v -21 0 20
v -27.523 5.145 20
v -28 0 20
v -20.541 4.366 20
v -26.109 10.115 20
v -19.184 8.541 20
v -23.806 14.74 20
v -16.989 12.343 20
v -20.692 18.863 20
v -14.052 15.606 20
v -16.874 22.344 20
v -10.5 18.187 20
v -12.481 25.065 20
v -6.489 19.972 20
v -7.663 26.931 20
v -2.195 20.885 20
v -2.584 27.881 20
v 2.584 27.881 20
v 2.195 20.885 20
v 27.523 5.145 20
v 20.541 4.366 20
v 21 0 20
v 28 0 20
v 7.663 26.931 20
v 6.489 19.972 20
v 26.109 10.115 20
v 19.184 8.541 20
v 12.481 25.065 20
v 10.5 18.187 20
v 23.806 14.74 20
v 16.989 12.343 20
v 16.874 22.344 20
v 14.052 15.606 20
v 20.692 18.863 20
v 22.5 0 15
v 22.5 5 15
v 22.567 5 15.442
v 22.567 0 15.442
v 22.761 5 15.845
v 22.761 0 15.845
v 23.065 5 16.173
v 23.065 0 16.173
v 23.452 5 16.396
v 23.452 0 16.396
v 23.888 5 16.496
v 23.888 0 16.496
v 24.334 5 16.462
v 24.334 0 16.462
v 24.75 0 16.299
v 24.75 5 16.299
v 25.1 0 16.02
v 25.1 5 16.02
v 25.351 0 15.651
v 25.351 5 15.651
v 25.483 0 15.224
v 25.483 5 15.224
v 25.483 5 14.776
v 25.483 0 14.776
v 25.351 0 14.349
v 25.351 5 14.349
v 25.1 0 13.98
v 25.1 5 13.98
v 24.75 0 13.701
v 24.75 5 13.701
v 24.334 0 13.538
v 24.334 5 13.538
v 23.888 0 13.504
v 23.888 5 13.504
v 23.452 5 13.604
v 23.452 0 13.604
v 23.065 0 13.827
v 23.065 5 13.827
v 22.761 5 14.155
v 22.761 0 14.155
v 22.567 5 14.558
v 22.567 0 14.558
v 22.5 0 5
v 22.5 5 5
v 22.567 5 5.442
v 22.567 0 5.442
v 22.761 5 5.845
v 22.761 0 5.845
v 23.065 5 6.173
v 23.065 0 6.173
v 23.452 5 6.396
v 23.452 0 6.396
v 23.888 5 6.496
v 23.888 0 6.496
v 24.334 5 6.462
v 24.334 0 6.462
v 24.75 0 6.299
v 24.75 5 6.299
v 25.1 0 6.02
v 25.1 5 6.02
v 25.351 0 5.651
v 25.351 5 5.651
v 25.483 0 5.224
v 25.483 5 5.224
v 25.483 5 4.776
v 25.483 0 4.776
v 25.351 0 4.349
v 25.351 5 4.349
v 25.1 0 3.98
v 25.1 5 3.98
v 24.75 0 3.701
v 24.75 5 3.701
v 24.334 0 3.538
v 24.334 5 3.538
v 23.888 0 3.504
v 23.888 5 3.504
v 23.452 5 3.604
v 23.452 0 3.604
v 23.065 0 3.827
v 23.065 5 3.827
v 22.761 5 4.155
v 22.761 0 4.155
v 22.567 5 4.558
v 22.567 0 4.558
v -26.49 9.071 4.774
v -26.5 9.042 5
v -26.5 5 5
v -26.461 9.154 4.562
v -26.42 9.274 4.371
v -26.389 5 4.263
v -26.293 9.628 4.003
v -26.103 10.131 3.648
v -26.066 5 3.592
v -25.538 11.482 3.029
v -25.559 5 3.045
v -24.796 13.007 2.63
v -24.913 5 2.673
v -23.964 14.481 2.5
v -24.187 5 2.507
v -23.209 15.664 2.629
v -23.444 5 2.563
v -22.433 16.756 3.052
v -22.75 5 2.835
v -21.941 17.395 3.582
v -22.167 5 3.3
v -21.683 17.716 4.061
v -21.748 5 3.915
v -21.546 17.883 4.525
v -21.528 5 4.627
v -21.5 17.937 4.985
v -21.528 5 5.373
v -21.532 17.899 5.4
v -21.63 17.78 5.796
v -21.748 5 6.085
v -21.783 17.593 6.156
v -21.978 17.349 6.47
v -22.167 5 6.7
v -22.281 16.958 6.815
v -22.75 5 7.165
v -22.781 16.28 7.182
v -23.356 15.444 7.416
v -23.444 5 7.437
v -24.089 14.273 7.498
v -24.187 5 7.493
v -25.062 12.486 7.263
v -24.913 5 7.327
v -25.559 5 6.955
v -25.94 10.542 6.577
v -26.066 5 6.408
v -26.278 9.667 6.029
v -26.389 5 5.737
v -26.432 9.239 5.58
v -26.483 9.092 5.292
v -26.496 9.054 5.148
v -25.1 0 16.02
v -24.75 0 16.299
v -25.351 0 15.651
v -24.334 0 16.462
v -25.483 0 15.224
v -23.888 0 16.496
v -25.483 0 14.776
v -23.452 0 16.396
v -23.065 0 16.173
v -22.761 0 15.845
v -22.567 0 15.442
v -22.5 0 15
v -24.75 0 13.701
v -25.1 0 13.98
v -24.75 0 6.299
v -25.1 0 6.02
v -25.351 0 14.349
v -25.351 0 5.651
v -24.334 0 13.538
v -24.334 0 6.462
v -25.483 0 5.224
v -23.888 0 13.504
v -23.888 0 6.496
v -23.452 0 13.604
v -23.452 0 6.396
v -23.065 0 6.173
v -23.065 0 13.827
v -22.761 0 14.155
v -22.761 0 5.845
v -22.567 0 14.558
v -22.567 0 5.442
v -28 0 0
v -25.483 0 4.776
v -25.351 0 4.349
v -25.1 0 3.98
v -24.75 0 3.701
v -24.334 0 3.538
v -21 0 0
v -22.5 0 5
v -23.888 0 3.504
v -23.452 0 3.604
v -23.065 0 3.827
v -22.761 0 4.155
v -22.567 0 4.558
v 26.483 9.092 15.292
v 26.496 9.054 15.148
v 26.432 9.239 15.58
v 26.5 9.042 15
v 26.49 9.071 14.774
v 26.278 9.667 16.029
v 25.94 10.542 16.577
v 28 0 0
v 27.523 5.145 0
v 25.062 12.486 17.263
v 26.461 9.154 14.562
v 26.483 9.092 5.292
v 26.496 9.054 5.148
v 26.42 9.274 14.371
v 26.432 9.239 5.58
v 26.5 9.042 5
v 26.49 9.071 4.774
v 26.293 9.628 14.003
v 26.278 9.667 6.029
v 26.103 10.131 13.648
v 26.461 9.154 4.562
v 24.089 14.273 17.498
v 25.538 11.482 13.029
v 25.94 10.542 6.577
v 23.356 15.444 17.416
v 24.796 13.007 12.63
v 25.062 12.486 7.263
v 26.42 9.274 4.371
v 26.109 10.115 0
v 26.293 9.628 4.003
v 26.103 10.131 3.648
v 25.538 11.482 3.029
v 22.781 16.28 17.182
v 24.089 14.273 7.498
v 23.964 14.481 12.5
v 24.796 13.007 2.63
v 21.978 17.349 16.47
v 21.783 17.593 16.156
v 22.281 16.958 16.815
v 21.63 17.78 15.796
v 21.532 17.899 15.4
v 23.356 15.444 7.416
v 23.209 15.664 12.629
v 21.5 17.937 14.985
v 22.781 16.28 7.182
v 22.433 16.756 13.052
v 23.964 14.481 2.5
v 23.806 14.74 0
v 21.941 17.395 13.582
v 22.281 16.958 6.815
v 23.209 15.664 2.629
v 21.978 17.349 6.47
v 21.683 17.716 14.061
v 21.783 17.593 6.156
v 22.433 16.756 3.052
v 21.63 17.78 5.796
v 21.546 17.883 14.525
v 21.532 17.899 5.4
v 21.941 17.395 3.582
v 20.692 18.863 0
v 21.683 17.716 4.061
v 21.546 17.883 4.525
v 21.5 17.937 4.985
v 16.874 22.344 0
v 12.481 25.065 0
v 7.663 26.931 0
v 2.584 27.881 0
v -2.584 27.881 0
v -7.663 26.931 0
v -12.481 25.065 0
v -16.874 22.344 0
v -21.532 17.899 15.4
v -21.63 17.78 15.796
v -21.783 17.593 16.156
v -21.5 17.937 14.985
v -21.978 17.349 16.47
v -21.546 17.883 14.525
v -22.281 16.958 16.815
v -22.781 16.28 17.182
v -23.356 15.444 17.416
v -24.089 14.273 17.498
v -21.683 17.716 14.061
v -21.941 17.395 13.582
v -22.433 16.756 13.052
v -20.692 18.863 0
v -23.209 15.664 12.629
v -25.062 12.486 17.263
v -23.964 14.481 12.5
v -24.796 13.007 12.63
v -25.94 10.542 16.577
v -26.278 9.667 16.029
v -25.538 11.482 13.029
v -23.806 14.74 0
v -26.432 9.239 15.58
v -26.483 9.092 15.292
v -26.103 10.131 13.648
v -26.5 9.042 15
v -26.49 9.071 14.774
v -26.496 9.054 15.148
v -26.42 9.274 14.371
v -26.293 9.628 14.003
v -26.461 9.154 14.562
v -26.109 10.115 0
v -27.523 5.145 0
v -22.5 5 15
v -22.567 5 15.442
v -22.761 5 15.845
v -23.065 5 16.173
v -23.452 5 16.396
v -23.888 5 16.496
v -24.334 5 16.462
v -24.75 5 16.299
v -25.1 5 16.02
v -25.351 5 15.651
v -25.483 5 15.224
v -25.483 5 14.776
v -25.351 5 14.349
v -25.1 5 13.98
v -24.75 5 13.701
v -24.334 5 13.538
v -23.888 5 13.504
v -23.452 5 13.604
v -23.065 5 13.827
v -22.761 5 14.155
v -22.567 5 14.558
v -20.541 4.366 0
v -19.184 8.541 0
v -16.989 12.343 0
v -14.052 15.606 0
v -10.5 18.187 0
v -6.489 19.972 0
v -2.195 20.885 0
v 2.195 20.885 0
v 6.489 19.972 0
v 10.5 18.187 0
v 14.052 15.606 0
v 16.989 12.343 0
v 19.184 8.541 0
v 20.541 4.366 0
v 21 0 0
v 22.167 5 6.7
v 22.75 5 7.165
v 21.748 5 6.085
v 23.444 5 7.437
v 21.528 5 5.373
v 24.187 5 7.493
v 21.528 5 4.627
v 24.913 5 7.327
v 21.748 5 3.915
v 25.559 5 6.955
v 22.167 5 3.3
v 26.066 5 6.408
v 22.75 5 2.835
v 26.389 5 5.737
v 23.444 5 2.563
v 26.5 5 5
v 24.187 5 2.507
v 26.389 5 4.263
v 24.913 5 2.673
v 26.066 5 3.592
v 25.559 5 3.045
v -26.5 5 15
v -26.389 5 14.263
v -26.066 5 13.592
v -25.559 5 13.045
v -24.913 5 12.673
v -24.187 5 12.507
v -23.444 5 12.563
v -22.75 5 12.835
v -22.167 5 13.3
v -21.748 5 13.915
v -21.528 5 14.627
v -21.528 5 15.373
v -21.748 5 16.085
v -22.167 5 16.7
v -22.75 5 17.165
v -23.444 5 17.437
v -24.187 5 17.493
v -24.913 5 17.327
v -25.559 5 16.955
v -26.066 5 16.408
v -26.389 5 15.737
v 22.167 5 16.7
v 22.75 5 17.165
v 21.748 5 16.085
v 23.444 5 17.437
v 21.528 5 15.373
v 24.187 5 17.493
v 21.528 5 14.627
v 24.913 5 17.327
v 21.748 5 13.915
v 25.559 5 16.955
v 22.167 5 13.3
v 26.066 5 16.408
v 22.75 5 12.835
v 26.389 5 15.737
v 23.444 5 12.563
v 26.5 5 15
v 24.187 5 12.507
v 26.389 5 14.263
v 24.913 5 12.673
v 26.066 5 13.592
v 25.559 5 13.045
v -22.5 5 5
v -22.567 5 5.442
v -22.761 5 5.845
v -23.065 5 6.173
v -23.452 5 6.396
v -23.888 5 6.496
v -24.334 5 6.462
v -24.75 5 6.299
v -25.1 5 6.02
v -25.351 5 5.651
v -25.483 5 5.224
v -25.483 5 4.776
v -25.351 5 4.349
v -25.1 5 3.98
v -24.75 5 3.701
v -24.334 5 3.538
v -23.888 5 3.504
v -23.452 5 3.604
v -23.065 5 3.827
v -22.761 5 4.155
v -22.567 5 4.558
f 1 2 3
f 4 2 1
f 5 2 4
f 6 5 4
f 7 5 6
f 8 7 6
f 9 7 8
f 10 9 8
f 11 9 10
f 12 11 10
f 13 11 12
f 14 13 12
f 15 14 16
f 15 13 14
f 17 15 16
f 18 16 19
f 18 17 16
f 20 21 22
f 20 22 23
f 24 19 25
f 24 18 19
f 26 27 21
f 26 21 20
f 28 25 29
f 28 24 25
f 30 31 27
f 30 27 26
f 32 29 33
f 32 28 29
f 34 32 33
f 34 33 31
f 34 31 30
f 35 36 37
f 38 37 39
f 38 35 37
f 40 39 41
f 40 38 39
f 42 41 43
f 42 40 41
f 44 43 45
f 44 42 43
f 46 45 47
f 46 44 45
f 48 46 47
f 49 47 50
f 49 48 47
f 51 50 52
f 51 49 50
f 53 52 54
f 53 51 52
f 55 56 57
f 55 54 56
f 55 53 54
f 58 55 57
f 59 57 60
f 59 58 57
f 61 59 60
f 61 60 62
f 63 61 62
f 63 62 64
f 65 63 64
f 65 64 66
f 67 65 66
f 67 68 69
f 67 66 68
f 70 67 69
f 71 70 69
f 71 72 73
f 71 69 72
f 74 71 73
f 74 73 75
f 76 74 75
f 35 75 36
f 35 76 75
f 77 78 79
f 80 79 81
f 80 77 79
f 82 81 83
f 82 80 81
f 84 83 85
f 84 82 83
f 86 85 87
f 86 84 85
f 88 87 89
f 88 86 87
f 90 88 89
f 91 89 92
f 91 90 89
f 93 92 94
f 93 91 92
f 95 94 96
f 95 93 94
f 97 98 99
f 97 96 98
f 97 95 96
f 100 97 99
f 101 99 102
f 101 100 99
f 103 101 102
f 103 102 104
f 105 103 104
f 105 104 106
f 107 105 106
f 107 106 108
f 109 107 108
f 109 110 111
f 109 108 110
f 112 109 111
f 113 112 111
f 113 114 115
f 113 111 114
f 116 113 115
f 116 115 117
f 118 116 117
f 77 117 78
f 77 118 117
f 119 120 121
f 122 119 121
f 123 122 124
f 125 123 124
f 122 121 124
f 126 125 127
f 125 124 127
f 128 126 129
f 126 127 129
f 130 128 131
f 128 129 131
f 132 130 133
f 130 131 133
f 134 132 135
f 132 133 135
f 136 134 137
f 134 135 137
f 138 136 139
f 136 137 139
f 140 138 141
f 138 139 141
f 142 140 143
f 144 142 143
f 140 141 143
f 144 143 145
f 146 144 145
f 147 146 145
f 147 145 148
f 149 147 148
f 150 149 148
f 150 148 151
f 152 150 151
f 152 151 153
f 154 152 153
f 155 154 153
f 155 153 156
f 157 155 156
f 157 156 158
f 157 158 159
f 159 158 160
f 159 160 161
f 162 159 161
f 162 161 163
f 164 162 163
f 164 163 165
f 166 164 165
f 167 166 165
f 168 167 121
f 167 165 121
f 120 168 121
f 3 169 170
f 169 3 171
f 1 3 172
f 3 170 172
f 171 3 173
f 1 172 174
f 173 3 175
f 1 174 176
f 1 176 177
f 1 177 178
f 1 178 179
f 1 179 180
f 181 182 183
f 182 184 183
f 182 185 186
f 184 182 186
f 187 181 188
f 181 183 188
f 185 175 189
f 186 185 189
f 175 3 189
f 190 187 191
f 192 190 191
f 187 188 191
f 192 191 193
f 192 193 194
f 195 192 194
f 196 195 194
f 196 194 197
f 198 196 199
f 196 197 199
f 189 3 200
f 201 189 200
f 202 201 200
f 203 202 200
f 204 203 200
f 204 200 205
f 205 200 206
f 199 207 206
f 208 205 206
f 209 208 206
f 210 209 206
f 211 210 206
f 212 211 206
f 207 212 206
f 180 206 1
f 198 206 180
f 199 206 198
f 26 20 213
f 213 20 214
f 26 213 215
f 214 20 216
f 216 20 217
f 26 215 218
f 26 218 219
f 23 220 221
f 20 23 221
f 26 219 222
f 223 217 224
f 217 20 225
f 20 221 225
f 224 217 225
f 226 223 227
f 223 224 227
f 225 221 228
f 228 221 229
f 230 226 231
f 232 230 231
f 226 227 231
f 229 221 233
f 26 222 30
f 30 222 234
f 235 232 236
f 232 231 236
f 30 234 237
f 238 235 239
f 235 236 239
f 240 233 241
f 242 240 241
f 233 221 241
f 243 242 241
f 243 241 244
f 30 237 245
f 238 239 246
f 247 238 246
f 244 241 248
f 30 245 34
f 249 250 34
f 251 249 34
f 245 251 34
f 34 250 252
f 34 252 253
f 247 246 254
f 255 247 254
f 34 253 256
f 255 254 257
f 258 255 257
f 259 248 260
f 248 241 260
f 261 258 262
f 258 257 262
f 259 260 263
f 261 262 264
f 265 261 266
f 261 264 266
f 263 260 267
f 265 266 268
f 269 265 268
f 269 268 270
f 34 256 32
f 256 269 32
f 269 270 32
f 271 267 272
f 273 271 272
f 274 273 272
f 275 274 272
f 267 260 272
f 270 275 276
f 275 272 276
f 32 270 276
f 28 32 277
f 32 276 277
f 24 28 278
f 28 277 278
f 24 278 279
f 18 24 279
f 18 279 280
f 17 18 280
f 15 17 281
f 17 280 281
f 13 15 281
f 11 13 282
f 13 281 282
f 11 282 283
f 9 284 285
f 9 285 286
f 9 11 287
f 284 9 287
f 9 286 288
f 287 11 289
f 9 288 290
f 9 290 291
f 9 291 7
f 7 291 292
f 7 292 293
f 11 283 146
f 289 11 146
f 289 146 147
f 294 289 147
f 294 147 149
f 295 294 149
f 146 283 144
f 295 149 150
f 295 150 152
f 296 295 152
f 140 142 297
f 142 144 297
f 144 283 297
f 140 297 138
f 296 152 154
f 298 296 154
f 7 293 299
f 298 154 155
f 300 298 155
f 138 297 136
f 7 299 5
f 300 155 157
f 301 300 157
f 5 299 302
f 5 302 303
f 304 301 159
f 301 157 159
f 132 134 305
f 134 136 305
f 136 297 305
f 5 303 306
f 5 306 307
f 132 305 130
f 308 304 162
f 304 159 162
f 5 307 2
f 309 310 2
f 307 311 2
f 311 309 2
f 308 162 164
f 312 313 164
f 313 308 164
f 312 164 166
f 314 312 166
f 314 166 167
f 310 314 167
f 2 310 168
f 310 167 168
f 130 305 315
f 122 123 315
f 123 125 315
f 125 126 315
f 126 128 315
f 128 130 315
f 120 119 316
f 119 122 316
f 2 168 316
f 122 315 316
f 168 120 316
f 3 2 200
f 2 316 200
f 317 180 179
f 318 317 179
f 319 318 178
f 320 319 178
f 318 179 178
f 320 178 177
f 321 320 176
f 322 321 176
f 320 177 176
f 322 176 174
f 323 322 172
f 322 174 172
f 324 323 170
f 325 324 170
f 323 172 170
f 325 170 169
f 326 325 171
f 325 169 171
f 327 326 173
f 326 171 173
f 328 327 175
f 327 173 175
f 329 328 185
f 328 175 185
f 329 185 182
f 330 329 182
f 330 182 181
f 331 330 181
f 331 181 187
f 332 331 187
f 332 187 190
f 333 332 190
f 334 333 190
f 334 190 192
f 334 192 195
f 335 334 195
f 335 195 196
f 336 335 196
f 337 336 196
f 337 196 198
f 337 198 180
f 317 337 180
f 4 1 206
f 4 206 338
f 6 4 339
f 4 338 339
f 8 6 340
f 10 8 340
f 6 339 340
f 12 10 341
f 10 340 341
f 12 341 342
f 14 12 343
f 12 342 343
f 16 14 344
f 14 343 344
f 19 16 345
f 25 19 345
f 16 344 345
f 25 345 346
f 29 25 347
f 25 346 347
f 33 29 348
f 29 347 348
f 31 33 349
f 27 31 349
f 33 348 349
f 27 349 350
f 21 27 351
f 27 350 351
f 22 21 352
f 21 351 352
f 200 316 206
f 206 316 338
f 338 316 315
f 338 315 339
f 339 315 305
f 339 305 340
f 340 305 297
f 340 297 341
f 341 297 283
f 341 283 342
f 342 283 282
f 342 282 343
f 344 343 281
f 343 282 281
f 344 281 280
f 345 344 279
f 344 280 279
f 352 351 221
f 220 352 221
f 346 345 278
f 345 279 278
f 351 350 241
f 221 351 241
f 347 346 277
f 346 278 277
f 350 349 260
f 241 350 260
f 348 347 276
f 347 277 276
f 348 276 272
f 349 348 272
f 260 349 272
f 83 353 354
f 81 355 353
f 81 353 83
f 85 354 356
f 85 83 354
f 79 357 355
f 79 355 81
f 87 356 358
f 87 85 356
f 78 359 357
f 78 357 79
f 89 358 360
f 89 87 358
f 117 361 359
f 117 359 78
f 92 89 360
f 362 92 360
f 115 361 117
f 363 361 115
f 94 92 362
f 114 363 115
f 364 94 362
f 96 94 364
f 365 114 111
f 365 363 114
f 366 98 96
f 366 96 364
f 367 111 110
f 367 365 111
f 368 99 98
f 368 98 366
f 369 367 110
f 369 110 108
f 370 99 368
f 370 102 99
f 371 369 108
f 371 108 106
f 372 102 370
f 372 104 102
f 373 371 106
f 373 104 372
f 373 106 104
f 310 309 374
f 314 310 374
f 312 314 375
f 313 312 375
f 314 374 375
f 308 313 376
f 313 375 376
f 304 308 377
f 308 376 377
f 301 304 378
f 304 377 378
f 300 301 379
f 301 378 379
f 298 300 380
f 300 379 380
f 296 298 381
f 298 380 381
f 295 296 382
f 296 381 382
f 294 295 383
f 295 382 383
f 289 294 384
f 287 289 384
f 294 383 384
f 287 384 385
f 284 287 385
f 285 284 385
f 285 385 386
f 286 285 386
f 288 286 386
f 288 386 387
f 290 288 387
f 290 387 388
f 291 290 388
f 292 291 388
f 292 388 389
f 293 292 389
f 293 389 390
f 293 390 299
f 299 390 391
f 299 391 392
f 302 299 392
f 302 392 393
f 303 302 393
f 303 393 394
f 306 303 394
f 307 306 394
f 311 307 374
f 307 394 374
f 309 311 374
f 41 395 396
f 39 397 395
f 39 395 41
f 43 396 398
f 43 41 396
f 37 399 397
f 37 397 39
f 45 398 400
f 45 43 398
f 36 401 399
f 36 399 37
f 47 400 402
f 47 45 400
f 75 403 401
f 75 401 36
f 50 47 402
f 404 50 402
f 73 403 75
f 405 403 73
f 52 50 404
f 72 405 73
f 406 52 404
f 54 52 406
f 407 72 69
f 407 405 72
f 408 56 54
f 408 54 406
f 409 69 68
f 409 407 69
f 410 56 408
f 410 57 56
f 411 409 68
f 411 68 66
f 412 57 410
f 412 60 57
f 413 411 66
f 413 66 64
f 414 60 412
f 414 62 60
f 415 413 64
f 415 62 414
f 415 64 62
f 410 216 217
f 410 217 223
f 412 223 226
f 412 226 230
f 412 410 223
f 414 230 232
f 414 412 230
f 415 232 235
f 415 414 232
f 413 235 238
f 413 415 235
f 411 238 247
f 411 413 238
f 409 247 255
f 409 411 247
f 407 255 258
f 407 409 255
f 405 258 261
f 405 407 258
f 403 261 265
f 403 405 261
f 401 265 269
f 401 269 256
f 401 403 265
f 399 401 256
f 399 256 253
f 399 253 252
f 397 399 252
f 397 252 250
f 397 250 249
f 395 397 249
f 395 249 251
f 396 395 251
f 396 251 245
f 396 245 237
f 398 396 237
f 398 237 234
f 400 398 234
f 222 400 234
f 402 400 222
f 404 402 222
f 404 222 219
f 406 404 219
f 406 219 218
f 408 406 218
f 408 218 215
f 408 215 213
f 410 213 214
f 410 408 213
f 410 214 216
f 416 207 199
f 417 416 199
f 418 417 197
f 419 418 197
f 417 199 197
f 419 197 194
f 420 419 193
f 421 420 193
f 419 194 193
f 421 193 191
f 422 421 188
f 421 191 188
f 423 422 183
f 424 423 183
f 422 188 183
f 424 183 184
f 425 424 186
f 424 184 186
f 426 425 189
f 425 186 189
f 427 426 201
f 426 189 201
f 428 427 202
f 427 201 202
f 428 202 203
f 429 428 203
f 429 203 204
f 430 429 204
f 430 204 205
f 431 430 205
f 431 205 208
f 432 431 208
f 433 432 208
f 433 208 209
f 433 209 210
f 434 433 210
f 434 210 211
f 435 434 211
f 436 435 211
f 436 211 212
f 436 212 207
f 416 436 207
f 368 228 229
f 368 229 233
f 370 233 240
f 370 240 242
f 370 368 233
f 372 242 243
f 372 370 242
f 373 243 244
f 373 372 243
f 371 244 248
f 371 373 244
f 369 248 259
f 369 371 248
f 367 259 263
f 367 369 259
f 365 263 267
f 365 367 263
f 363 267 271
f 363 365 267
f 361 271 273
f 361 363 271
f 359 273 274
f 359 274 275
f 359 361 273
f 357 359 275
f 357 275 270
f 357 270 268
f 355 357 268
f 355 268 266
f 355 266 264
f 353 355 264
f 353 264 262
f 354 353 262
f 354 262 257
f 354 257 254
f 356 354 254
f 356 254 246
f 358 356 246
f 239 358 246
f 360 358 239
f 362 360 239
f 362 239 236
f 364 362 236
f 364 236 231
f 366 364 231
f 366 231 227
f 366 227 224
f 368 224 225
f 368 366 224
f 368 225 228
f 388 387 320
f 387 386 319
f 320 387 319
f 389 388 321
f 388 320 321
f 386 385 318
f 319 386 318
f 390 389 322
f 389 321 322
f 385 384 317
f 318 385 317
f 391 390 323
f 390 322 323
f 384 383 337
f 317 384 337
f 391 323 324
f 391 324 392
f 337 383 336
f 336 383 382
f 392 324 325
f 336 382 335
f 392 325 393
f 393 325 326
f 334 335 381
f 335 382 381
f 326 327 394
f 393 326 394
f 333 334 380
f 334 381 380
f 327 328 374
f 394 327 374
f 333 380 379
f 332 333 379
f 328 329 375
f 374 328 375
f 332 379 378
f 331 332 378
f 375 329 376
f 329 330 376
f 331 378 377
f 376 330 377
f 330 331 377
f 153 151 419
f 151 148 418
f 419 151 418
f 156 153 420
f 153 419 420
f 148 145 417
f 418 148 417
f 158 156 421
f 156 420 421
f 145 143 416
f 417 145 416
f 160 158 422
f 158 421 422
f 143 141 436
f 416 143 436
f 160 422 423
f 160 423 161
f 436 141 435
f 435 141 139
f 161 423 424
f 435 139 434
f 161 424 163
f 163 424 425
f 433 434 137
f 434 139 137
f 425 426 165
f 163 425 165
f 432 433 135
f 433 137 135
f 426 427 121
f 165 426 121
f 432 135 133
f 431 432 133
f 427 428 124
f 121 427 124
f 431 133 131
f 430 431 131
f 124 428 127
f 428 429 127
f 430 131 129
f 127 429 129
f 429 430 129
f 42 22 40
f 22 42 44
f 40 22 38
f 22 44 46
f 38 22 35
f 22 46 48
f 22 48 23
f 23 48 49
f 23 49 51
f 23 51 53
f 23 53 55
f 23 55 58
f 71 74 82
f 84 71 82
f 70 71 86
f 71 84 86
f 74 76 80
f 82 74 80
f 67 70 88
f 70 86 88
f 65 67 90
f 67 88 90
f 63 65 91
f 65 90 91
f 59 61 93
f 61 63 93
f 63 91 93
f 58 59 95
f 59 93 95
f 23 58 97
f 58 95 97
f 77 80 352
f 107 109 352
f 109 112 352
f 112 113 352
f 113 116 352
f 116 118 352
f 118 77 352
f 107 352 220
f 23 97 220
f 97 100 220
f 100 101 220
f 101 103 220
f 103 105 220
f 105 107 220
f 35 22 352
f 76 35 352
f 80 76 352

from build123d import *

# Parameters (mm, degrees)
EXTRUDE_1_DEPTH     = 20
SKETCH_2_R          = 1.5
CUT_EXTRUDE_1_DEPTH = 20
SKETCH_3_R          = 2.5
CUT_EXTRUDE_2_DEPTH = 20


with BuildPart() as part:
    # 草图1 → 凸台-拉伸1 (new body)
    with BuildSketch(Plane.XY):
        with BuildLine():
            Line((-28, 0), (-21, 0))
            ThreePointArc((-21, 0), (0, 21), (21, 0))
            Line((21, 0), (28, 0))
            ThreePointArc((28, 0), (0, 28), (-28, 0))
        make_face()
    extrude(amount=EXTRUDE_1_DEPTH)

    # 草图2 → 切除-拉伸1 (cut)
    with BuildSketch(Plane.XZ):
        with Locations((-24, 5)):
            Circle(SKETCH_2_R)
        with Locations((-24, 15)):
            Circle(SKETCH_2_R)
    cut_extrude_1 = extrude(amount=-CUT_EXTRUDE_1_DEPTH, mode=Mode.SUBTRACT)

    # 镜向1: 切除-拉伸1 across plane
    add(cut_extrude_1.mirror(Plane(origin=(0, 0, 0), x_dir=(0, 0, 1), z_dir=(1, 0, 0))), mode=Mode.SUBTRACT)

    # 草图3 → 切除-拉伸2 (cut)
    with BuildSketch(Plane(origin=(0, 5, 0), x_dir=(-1, 0, 0), z_dir=(0, -1, 0))):
        with Locations((24, -5)):
            Circle(SKETCH_3_R)
        with Locations((24, -15)):
            Circle(SKETCH_3_R)
    cut_extrude_2 = extrude(amount=-CUT_EXTRUDE_2_DEPTH, mode=Mode.SUBTRACT)

    # 镜向2: 切除-拉伸2 across plane
    add(cut_extrude_2.mirror(Plane(origin=(0, 0, 0), x_dir=(0, 0, 1), z_dir=(1, 0, 0))), mode=Mode.SUBTRACT)


solid = part.part
